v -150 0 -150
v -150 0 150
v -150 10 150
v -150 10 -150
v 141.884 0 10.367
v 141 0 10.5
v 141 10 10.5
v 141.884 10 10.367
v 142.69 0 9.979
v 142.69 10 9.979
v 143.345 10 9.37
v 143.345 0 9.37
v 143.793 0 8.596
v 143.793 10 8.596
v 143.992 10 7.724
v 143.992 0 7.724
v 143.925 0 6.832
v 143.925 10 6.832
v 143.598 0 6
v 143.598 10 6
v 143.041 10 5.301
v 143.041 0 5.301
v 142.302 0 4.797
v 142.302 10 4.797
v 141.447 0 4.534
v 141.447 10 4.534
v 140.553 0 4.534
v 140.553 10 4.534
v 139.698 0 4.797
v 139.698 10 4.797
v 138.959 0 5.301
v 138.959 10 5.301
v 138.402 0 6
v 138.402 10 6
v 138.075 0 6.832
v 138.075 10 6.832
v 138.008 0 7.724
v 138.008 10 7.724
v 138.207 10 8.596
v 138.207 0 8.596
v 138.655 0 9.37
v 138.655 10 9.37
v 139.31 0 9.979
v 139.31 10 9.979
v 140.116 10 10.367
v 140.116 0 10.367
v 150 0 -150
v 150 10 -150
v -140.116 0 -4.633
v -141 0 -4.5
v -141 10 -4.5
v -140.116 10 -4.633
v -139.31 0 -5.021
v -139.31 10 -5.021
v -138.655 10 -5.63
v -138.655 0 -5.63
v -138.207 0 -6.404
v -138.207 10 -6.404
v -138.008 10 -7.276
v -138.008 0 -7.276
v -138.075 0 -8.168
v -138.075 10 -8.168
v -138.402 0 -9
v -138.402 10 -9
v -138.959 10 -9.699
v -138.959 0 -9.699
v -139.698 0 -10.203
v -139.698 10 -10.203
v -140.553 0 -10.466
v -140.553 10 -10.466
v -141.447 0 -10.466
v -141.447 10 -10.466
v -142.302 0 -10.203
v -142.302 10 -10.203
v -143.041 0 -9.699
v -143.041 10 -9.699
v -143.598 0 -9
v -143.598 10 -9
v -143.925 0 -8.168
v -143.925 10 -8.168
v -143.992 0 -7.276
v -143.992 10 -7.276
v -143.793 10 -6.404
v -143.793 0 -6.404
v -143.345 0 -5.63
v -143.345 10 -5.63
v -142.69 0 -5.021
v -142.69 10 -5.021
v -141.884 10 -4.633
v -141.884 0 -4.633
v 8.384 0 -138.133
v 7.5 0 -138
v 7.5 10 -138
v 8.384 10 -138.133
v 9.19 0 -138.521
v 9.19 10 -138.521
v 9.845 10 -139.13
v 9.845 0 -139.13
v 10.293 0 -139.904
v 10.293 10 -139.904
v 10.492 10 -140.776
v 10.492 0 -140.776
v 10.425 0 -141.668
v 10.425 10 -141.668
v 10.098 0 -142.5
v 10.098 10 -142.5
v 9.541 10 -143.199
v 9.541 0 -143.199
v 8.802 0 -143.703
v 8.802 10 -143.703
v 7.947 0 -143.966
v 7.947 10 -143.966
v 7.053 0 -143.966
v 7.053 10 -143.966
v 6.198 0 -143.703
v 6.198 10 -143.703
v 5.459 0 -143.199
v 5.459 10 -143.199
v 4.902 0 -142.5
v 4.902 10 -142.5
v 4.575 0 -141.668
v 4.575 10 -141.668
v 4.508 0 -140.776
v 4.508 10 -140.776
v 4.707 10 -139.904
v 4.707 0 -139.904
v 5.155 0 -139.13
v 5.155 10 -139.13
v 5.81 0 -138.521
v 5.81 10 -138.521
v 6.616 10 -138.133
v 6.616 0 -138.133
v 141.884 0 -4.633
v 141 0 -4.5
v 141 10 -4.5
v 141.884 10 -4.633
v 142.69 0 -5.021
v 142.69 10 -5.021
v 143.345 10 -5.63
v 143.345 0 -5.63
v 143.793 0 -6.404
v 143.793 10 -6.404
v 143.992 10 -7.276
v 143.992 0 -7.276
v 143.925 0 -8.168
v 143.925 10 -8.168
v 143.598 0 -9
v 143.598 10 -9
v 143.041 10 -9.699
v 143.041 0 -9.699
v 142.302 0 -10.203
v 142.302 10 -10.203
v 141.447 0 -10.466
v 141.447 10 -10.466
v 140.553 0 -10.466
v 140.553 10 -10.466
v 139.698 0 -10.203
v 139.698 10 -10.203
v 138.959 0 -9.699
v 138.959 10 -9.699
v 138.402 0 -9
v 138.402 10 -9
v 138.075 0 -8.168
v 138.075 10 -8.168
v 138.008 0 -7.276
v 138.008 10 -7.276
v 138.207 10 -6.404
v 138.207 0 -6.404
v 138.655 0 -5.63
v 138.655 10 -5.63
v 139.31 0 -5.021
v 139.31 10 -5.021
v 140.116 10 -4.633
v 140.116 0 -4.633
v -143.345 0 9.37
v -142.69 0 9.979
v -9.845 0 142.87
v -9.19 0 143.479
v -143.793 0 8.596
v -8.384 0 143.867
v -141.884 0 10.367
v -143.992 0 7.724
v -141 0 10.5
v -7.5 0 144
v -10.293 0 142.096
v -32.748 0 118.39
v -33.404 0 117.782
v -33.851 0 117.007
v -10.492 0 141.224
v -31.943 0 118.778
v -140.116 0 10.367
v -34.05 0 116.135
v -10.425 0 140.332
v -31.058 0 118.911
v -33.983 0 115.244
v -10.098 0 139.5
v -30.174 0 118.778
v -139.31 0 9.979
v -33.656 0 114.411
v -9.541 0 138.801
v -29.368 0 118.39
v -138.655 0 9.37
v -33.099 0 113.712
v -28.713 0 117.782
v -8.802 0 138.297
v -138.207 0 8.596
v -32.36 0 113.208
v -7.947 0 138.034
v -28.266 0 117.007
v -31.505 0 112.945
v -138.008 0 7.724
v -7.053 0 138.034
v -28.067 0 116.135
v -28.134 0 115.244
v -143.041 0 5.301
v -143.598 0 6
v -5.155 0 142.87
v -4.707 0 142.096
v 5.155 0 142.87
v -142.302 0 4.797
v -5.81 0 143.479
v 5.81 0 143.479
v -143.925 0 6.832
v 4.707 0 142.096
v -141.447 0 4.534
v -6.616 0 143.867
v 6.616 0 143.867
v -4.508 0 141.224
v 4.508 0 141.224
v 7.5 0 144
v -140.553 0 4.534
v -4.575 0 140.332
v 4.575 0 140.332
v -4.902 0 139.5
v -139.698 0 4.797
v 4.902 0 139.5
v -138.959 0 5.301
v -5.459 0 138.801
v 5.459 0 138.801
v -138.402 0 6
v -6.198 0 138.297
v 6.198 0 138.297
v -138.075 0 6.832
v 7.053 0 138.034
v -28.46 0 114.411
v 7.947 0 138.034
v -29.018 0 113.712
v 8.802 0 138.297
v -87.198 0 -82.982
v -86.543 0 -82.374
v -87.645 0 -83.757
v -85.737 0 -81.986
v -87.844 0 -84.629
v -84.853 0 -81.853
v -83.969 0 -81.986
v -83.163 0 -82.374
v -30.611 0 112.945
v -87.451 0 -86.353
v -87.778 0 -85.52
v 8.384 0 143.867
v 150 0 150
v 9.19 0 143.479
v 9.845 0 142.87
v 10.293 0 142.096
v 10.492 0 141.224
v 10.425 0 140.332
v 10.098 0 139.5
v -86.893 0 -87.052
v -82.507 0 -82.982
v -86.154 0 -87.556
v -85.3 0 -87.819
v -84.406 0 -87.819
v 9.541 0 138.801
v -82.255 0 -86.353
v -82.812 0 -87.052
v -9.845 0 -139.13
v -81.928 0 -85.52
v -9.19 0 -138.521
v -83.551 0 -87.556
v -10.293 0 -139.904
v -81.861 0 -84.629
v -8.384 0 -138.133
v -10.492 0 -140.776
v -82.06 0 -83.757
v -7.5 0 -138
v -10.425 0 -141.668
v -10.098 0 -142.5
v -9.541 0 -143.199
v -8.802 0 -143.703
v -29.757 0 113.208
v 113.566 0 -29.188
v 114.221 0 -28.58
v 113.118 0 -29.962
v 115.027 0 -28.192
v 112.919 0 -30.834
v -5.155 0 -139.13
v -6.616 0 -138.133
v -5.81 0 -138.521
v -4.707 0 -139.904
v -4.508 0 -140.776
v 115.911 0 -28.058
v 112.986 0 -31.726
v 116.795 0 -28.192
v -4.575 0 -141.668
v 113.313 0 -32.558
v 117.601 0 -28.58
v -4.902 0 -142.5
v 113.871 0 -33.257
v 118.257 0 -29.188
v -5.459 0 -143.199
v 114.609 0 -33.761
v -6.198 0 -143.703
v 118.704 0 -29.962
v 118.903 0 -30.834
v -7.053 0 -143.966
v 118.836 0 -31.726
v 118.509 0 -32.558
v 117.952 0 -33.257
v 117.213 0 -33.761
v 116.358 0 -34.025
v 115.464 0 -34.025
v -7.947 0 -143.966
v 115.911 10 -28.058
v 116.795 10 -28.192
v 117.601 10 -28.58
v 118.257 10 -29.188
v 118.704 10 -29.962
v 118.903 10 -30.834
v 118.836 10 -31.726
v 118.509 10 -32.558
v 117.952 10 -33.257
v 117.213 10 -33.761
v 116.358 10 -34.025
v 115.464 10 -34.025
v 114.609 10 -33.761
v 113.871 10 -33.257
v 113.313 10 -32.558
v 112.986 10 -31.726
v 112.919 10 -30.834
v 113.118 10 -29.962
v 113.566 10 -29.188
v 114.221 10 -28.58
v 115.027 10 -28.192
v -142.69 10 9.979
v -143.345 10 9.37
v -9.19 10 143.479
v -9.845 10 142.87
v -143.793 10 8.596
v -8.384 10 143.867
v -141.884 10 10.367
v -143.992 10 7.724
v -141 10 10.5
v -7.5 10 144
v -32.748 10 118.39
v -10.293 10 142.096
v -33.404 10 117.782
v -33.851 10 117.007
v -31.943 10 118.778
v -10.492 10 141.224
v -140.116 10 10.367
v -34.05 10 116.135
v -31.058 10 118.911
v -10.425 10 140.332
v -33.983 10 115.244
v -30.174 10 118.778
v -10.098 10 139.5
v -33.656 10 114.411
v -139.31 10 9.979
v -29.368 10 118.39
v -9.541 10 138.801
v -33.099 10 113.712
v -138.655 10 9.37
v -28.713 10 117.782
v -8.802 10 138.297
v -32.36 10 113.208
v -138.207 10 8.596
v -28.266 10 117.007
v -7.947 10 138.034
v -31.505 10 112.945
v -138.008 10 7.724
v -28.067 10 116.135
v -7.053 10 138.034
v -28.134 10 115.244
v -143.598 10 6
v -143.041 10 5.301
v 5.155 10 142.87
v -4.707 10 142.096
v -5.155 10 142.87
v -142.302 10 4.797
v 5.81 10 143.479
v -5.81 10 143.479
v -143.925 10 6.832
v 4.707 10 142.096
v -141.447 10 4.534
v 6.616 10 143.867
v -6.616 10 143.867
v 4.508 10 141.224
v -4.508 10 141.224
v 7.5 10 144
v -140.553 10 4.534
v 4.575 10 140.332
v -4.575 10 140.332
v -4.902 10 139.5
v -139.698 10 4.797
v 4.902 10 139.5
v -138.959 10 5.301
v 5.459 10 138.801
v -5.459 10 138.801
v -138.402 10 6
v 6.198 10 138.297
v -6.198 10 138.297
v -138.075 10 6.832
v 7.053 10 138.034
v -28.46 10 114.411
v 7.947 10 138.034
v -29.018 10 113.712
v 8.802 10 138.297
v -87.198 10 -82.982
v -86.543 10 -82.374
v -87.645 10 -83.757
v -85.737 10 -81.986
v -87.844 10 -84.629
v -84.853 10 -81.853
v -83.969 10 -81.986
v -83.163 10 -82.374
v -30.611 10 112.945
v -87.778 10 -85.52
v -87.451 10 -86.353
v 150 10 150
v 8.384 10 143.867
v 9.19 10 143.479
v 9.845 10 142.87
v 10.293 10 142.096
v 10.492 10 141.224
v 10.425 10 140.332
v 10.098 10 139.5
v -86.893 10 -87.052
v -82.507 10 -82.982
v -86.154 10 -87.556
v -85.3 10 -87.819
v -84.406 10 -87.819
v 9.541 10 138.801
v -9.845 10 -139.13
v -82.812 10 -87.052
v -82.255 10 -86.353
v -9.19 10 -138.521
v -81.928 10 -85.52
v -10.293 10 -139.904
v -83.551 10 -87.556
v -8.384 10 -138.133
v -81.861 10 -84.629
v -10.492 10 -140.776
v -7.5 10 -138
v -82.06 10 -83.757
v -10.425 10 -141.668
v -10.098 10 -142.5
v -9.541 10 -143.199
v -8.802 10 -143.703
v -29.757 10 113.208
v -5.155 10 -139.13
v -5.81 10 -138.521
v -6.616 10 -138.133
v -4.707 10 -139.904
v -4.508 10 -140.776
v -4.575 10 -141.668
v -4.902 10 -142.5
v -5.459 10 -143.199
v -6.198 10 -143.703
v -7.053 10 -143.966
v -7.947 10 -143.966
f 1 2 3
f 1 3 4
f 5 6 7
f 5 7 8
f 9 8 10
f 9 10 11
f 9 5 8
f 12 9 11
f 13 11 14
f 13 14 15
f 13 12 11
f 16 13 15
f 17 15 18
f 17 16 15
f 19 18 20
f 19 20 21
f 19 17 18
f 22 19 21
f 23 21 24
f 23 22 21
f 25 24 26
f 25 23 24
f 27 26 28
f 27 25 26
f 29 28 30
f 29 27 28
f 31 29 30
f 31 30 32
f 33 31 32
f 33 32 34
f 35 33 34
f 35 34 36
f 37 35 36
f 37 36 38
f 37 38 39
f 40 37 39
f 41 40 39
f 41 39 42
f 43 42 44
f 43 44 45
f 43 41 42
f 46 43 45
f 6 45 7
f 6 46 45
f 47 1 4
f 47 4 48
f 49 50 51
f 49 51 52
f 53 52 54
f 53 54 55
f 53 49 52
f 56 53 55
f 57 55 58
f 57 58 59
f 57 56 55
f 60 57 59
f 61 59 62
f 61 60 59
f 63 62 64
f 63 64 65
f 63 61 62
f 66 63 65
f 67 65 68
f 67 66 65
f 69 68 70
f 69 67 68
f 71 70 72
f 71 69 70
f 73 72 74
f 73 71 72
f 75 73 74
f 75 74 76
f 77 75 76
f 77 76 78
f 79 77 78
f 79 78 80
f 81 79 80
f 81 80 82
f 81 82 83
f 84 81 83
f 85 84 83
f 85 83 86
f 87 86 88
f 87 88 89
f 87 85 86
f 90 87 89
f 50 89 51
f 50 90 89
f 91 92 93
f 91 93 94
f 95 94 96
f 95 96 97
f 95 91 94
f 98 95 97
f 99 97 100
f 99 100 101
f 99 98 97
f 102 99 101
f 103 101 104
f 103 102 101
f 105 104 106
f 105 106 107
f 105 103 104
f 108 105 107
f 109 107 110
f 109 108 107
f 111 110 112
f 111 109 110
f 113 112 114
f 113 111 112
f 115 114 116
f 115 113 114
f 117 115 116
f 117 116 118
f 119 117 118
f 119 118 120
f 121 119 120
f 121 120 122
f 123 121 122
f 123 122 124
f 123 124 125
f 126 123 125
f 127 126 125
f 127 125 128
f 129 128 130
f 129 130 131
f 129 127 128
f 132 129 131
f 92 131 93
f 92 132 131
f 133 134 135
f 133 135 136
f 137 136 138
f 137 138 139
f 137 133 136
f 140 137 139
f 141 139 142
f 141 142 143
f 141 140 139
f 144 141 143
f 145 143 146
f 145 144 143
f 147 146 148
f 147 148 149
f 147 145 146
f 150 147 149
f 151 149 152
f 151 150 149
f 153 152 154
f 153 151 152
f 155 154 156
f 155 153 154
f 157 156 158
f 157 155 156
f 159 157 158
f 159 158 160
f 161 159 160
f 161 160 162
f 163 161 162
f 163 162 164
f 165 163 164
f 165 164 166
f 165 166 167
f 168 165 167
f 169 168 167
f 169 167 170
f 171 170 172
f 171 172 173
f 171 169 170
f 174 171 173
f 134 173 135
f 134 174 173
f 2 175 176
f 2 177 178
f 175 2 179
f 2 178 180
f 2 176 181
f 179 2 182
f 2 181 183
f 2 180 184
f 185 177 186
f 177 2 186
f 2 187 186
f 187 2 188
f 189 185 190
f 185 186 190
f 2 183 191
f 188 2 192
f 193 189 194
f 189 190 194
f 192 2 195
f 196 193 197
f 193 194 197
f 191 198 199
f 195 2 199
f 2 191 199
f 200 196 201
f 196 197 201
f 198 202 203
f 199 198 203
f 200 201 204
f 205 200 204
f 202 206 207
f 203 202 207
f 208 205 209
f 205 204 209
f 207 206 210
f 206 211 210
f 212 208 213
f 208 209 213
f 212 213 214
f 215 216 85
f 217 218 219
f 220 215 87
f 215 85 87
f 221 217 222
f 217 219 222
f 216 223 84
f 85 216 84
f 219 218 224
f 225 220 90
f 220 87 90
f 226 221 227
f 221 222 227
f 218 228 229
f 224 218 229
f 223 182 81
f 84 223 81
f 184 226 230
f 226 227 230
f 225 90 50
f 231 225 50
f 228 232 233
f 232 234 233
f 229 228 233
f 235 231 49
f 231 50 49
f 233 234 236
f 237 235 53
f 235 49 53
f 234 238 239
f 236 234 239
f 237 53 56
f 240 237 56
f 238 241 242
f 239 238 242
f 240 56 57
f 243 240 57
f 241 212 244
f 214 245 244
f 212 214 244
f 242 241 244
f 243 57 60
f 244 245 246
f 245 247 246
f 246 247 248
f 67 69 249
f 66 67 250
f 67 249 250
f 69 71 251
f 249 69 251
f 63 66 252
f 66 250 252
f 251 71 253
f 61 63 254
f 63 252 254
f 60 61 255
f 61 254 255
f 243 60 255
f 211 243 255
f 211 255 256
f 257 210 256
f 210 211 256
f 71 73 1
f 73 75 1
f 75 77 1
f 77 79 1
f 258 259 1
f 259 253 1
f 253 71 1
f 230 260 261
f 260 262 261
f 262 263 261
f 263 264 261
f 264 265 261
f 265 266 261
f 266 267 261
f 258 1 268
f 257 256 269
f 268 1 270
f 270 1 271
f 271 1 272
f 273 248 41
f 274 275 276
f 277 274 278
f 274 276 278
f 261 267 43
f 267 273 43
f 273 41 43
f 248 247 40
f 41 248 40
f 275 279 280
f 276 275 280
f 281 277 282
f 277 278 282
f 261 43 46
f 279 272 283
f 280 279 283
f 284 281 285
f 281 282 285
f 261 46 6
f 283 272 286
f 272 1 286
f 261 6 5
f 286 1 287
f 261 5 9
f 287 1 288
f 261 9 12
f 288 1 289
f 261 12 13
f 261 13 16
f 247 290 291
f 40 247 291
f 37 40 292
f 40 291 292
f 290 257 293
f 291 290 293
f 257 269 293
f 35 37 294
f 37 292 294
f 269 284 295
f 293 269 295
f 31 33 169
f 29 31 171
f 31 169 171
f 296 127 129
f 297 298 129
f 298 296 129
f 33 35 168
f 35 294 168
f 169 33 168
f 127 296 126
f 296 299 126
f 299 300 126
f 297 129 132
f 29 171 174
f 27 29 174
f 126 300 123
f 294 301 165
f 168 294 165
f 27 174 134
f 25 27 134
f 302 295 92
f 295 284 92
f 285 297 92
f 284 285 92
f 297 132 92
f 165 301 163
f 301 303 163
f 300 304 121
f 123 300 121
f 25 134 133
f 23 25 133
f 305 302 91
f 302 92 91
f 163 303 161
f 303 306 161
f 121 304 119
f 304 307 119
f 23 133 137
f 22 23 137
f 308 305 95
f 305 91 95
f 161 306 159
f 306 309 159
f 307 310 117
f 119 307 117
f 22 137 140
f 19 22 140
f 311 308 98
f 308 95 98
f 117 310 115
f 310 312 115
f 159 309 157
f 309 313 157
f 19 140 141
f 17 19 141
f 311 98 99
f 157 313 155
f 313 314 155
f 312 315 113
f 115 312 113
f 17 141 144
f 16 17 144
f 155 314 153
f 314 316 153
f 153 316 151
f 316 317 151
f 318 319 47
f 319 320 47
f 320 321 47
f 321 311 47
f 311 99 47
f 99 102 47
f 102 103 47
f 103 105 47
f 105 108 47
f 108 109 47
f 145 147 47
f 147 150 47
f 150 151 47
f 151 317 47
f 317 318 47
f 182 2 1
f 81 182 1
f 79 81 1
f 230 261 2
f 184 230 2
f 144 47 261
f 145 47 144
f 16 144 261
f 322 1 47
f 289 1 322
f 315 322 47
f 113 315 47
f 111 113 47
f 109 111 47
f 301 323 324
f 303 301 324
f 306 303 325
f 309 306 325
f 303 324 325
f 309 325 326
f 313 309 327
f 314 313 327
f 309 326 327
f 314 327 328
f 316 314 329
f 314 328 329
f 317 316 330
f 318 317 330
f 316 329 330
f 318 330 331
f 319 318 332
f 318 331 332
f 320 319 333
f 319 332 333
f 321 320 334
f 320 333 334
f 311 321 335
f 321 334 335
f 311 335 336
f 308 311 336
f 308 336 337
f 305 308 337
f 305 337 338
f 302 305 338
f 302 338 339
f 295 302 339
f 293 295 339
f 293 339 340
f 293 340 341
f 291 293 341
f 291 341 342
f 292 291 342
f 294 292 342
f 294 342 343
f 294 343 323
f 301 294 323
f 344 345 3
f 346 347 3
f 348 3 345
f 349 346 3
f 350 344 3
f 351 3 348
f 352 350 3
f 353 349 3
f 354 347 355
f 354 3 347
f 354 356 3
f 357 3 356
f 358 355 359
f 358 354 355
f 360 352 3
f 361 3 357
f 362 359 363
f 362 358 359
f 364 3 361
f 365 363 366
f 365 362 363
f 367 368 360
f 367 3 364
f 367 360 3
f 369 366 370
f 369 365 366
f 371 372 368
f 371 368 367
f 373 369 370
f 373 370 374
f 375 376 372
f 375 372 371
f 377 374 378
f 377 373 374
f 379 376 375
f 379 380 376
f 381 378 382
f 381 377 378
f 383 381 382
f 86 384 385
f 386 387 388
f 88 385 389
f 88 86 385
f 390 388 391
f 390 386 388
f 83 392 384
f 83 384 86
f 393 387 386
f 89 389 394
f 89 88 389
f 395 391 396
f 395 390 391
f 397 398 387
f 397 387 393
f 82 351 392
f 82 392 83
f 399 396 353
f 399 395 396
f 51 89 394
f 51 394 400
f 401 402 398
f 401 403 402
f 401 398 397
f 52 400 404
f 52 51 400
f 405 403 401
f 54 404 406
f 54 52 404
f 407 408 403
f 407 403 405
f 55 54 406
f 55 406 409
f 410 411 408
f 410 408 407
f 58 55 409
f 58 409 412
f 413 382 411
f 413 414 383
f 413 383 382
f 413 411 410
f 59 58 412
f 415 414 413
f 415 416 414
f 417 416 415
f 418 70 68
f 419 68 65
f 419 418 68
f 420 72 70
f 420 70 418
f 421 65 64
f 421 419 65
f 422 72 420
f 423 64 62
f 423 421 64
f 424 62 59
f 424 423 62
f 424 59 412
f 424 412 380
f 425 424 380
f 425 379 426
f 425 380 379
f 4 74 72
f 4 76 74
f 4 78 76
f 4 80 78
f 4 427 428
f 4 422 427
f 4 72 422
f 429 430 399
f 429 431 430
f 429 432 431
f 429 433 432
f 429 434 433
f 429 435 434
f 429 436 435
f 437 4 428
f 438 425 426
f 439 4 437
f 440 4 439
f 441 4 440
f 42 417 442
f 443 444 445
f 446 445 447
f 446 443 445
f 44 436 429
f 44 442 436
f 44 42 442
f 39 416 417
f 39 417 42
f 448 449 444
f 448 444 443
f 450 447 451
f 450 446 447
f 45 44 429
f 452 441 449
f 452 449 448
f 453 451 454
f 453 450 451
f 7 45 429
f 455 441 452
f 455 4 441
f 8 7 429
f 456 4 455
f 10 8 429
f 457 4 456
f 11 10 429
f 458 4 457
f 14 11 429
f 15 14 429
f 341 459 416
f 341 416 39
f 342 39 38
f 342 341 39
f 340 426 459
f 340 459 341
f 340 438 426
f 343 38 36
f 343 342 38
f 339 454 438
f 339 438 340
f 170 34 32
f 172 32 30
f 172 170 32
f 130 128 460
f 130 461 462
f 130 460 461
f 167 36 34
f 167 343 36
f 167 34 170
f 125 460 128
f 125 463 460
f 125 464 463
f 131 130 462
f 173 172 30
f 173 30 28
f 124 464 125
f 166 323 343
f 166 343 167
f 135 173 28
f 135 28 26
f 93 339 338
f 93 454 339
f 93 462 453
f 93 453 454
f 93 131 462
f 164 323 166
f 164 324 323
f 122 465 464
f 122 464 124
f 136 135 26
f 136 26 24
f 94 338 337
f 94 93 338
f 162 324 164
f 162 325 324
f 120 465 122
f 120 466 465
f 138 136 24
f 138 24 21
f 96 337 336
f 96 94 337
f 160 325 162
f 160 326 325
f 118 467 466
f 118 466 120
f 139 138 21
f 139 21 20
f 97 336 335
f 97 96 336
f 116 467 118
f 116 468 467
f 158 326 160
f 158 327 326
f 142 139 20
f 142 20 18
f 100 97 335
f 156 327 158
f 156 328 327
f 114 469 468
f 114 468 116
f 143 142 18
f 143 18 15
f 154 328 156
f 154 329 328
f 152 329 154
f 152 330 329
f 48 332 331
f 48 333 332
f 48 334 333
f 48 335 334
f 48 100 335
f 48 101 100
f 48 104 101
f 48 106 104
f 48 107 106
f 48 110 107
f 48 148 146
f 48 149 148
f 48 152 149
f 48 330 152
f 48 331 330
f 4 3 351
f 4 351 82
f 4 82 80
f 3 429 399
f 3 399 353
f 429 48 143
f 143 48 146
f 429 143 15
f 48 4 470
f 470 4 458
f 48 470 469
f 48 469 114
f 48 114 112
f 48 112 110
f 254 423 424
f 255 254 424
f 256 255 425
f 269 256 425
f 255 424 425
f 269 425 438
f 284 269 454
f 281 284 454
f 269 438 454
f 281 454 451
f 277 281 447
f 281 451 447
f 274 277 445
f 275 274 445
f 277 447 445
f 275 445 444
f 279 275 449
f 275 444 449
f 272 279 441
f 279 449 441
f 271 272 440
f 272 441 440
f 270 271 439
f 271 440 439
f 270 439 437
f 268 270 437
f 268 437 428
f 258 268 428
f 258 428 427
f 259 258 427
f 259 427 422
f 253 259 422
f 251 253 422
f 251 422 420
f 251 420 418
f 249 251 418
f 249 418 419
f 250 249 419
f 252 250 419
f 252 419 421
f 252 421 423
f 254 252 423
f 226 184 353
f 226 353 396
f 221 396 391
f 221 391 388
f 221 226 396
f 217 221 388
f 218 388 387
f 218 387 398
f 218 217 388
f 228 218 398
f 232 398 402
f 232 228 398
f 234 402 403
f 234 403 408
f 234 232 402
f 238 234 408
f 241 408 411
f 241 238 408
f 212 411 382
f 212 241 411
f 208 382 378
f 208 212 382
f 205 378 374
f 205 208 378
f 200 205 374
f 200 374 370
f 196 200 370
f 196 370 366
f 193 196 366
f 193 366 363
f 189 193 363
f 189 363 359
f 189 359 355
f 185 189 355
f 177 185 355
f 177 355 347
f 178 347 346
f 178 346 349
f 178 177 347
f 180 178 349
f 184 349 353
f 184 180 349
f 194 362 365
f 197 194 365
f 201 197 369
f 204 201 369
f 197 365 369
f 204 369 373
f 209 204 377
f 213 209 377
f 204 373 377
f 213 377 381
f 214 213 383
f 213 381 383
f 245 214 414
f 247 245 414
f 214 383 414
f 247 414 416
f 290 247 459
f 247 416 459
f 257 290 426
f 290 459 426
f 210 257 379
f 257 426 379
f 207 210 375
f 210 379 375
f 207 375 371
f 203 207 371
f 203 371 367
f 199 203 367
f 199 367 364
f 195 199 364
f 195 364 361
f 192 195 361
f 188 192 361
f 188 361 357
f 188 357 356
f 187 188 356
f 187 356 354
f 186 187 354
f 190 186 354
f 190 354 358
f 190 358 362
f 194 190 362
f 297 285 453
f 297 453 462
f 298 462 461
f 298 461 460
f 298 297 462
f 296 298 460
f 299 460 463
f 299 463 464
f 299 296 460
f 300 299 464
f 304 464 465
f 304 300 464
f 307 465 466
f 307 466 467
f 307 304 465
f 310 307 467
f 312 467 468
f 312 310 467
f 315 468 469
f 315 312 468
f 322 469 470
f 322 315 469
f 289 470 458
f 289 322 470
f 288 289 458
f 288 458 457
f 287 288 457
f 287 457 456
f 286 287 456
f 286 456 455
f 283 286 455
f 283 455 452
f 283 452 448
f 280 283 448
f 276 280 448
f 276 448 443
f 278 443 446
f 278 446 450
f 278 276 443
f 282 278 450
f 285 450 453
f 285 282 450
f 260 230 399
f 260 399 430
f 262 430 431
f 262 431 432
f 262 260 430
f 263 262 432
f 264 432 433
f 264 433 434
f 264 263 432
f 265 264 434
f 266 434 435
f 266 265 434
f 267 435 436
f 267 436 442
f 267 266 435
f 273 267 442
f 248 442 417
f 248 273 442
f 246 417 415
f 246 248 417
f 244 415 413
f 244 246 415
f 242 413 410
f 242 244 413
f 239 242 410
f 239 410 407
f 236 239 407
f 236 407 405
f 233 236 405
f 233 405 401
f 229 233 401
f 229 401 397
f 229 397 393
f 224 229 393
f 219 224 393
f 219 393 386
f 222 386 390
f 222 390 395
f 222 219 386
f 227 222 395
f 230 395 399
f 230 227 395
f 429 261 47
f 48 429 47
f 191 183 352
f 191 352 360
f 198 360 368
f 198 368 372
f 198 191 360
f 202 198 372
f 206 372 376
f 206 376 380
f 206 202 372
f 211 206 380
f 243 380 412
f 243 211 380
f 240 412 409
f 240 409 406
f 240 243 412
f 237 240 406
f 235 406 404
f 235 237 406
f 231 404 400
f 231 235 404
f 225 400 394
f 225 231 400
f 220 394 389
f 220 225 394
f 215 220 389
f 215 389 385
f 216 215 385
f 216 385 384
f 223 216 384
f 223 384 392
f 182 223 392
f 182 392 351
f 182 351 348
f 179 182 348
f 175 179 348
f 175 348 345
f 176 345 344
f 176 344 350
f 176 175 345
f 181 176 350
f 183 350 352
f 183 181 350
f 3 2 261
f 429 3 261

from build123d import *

# Parameters (mm, degrees)
SKETCH1_W           = 300
SKETCH1_H           = 300
SKETCH1_R           = 3
BOSS_EXTRUDE1_DEPTH = 10
SKETCH2_R           = 3
CUT_EXTRUDE1_DEPTH  = 30


with BuildPart() as part:
    # Sketch1 → Boss-Extrude1 (new body)
    with BuildSketch(Plane(origin=(0, 0, 0), x_dir=(1, 0, 0), z_dir=(0, 1, 0))):
        Rectangle(SKETCH1_W, SKETCH1_H)
        with Locations(Location((-141, 7.5, 0), (0, 0, 270))):
            Circle(SKETCH1_R, mode=Mode.SUBTRACT)
        with Locations(Location((-141, -7.5, 0), (0, 0, 270))):
            Circle(SKETCH1_R, mode=Mode.SUBTRACT)
        with Locations(Location((7.5, 141, 0), (0, 0, 270))):
            Circle(SKETCH1_R, mode=Mode.SUBTRACT)
        with Locations(Location((-7.5, 141, 0), (0, 0, 270))):
            Circle(SKETCH1_R, mode=Mode.SUBTRACT)
        with Locations(Location((141, -7.5, 0), (0, 0, 270))):
            Circle(SKETCH1_R, mode=Mode.SUBTRACT)
        with Locations(Location((141, 7.5, 0), (0, 0, 270))):
            Circle(SKETCH1_R, mode=Mode.SUBTRACT)
        with Locations(Location((-7.5, -141, 0), (0, 0, 270))):
            Circle(SKETCH1_R, mode=Mode.SUBTRACT)
        with Locations(Location((7.5, -141, 0), (0, 0, 270))):
            Circle(SKETCH1_R, mode=Mode.SUBTRACT)
    extrude(amount=BOSS_EXTRUDE1_DEPTH)

    # Sketch2 → Cut-Extrude1 (cut)
    with BuildSketch(Plane(origin=(0, 10, 0), x_dir=(1, 0, 0), z_dir=(0, 1, 0))):
        with Locations(Location((-84.852813742, 84.852813742, 0), (0, 0, 270))):
            Circle(SKETCH2_R)
        with Locations(Location((115.911099155, 31.058285412, 0), (0, 0, 270))):
            Circle(SKETCH2_R)
        with Locations(Location((-31.058285412, -115.911099155, 0), (0, 0, 270))):
            Circle(SKETCH2_R)
    extrude(amount=-CUT_EXTRUDE1_DEPTH, mode=Mode.SUBTRACT)


solid = part.part
